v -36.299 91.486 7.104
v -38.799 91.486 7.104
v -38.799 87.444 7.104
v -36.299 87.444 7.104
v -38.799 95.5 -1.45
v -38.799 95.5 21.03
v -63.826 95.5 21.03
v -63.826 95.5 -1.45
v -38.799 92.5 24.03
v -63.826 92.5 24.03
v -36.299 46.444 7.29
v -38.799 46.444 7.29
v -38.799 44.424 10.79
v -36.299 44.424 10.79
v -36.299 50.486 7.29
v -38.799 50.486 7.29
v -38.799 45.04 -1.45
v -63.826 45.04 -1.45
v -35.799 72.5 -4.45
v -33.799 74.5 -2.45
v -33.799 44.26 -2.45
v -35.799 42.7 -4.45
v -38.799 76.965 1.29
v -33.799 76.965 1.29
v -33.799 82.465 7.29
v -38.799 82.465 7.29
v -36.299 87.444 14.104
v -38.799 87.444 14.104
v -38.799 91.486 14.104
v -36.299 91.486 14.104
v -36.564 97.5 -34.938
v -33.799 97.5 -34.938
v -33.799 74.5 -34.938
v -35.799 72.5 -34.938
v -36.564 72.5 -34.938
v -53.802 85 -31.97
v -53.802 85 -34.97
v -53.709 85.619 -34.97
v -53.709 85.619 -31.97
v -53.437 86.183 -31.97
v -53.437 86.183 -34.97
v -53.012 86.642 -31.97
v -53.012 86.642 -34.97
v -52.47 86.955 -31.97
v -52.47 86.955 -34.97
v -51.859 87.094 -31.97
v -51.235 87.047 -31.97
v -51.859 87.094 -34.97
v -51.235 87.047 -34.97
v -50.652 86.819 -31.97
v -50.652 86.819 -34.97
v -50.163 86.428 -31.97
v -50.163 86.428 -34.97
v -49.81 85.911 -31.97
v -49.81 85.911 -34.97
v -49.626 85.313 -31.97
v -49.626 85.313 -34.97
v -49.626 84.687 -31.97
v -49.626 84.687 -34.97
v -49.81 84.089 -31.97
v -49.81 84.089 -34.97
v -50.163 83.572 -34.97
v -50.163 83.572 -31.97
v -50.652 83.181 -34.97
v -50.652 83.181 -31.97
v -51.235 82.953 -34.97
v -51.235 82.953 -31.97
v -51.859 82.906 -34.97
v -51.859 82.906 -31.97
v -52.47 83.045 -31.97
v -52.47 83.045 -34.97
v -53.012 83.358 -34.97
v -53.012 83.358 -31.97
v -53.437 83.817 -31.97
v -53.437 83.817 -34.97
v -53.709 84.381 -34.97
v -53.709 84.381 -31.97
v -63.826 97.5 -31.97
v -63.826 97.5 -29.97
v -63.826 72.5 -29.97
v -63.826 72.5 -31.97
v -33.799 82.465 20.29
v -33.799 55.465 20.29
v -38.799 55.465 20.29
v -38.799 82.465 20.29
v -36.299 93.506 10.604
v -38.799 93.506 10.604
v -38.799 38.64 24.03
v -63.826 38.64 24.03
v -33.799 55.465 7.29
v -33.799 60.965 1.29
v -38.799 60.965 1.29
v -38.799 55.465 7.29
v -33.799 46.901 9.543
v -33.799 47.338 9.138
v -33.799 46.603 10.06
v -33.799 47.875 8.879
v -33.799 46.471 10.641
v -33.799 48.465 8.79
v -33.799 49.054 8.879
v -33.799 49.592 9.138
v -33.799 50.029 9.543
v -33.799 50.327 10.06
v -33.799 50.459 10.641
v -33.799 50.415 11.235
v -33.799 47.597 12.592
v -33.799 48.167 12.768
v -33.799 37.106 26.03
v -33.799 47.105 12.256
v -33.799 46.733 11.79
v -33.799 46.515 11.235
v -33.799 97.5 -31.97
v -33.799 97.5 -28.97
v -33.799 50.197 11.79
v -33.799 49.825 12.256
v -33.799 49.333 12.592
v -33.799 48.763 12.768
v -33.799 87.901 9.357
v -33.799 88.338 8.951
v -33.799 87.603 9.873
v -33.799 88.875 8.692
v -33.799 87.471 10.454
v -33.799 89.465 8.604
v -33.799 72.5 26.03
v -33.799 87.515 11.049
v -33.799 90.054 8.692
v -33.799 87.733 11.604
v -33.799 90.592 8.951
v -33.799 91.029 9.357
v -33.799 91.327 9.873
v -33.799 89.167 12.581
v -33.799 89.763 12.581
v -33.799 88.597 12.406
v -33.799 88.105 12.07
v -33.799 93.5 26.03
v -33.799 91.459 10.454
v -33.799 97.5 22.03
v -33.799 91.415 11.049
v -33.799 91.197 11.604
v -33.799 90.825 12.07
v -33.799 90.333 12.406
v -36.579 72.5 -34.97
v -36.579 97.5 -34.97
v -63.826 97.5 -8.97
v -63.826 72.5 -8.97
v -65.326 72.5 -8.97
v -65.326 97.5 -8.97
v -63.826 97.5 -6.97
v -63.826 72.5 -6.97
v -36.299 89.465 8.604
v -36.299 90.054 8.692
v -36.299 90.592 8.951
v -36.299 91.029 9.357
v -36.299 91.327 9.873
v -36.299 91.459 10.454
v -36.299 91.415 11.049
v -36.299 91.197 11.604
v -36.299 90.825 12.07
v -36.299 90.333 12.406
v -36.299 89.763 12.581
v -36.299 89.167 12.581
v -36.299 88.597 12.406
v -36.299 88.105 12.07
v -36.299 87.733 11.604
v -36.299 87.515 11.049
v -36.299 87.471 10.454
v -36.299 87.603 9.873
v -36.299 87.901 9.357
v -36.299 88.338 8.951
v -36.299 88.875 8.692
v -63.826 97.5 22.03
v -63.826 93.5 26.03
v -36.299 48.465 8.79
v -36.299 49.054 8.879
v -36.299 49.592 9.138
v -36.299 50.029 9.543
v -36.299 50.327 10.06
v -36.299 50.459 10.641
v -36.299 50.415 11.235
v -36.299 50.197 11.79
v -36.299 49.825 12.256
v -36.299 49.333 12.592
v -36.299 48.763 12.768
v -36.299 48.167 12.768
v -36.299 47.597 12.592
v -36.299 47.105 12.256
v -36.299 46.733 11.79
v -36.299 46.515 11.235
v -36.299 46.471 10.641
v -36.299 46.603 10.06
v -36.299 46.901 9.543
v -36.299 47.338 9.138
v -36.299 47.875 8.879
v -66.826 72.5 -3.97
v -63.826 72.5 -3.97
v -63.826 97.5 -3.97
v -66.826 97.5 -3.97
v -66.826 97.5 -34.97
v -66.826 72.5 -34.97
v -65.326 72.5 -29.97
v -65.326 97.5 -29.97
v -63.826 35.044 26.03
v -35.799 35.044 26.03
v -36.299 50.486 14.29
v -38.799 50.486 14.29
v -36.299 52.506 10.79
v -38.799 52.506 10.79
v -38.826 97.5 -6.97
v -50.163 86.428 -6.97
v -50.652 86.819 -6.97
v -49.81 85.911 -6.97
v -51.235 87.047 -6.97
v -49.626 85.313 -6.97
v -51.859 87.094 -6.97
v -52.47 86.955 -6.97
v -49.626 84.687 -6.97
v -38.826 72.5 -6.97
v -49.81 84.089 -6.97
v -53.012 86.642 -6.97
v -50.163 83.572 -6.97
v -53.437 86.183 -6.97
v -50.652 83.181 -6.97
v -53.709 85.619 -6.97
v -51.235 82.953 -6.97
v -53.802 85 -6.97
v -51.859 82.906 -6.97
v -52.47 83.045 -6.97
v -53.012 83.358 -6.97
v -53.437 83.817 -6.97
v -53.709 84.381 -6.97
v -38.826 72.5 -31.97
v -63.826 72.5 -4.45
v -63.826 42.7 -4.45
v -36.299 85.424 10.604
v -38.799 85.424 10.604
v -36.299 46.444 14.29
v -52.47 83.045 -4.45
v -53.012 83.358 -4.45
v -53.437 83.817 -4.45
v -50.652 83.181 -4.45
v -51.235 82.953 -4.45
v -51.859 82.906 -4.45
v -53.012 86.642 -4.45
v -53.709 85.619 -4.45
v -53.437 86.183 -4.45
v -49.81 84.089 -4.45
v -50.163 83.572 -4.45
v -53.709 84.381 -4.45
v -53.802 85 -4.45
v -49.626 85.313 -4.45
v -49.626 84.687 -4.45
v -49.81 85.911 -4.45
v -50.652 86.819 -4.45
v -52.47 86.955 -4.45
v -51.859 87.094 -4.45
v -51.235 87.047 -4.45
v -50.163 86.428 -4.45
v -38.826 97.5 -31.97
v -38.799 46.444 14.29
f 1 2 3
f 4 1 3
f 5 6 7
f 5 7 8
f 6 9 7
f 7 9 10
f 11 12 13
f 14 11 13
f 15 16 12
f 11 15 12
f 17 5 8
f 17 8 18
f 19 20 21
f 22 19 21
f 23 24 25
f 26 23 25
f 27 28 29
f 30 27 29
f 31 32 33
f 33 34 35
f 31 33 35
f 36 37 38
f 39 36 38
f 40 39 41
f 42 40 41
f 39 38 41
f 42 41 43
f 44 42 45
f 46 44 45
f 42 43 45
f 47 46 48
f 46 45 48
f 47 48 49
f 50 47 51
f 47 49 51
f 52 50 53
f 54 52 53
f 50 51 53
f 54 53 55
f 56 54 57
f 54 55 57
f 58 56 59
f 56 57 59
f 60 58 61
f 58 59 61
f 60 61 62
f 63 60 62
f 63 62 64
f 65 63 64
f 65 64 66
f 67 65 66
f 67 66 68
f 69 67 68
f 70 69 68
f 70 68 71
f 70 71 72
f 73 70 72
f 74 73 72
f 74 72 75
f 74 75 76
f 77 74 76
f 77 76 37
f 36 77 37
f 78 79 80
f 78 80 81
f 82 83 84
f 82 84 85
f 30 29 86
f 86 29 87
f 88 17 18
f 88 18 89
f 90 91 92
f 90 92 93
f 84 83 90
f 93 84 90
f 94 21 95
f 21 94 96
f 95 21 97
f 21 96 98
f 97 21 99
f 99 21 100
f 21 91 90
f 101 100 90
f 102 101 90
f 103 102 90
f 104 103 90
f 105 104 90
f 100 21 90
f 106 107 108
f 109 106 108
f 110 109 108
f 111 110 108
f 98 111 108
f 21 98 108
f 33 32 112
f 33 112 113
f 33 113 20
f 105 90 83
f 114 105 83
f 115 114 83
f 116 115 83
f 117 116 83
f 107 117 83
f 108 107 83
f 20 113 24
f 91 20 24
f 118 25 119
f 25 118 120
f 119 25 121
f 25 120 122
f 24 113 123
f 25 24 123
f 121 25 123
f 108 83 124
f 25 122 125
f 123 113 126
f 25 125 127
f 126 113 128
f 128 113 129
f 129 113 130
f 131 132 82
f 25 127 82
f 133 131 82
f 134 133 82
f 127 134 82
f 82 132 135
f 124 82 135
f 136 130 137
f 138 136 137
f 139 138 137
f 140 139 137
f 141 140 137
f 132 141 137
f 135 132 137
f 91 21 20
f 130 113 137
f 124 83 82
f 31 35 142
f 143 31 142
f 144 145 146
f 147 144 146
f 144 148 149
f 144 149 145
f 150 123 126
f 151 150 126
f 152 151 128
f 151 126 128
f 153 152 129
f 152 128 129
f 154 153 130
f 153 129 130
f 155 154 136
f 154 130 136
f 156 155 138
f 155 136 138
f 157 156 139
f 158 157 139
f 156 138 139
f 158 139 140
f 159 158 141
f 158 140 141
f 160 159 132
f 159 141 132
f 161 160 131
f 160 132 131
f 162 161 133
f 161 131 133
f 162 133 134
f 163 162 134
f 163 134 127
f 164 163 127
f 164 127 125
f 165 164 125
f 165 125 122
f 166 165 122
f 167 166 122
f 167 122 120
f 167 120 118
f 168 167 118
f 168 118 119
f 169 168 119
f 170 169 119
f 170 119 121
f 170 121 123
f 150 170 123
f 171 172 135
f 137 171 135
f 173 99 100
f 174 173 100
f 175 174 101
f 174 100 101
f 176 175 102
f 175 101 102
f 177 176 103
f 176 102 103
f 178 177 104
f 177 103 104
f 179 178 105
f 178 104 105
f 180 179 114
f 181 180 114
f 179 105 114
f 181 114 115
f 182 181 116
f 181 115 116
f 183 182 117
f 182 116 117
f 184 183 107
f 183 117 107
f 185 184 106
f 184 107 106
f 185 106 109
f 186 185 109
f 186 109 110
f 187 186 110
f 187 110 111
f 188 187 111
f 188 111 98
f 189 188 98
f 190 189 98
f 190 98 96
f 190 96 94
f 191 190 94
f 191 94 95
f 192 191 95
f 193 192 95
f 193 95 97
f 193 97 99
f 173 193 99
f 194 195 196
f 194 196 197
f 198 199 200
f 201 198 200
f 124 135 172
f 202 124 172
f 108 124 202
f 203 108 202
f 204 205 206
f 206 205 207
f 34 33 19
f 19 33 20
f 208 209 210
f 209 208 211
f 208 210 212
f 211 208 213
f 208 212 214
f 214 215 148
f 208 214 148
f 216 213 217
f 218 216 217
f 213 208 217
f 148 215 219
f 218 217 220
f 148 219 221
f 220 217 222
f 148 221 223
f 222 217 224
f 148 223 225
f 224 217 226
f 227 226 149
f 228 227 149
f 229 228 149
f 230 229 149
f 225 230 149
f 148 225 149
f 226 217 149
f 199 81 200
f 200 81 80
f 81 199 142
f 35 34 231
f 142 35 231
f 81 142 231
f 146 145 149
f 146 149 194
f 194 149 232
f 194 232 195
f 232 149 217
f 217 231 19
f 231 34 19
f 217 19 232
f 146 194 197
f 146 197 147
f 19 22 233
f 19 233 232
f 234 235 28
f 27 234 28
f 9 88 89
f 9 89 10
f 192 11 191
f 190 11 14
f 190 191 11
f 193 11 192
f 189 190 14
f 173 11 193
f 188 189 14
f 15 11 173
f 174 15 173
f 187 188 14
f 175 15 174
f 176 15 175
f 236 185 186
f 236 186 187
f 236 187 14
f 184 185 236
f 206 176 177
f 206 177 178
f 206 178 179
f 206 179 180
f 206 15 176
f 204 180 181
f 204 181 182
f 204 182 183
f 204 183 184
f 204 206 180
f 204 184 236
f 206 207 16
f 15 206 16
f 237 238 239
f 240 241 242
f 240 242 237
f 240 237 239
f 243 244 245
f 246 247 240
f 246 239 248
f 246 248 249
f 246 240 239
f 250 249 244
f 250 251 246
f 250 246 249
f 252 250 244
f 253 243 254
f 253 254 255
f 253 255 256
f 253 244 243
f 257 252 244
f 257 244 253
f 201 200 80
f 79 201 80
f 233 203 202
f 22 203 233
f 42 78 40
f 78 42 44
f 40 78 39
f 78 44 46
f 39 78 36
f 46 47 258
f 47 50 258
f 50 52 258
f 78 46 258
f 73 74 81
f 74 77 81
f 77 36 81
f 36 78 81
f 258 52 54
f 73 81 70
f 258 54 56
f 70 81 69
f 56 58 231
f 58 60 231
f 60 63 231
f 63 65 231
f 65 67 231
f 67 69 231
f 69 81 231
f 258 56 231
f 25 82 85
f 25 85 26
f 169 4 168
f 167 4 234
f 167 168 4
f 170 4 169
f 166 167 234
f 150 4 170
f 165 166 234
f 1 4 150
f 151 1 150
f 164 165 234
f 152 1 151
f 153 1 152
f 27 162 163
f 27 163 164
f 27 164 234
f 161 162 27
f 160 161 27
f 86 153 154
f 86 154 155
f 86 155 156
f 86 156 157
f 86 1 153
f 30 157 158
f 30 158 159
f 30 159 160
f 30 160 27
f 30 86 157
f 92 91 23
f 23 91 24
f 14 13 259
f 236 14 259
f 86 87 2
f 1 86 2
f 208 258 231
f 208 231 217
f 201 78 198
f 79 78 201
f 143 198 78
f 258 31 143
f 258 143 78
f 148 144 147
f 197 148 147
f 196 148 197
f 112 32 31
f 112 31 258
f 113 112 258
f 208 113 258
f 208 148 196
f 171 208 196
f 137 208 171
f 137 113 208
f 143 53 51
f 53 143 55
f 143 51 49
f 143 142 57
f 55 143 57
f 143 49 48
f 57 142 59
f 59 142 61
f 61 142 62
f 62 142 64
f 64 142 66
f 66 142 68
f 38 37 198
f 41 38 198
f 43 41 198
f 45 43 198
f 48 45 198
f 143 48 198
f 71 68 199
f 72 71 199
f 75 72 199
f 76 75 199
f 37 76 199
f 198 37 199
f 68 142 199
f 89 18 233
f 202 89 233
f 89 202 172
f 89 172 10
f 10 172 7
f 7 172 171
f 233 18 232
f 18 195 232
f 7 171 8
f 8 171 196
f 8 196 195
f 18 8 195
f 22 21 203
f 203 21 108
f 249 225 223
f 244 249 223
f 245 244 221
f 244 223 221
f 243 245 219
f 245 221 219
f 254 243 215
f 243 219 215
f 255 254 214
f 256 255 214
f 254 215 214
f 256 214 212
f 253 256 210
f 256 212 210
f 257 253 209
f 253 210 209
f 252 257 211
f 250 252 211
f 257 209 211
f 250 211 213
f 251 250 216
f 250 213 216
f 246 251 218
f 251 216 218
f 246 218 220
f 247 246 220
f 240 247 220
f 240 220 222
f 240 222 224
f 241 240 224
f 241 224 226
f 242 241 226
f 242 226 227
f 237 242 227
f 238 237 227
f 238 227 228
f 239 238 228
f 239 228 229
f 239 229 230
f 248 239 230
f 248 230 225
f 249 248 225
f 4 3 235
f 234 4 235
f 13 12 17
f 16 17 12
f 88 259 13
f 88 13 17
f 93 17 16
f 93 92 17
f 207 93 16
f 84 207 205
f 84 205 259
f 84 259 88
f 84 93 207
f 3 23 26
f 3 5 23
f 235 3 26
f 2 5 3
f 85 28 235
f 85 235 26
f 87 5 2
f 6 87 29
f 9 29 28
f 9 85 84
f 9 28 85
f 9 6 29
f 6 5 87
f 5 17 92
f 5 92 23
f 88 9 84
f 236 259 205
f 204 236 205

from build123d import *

# Parameters (mm, degrees)
EXTRUDE_1_DEPTH           = 110
CUT_EXTRUDE_4_DEPTH       = 134.373777696
SKETCH_7_W                = 16.60831278
SKETCH_7_H                = 38.473598513
CUT_EXTRUDE_14_DEPTH      = 134.373777696
SKETCH_8_W                = 5
SKETCH_8_H                = 30.968526609
EXTRUDE_2_DEPTH           = 110
SKETCH_10_W               = 5
SKETCH_10_H               = 26
EXTRUDE_4_DEPTH           = 110
SKETCH_16_W               = 45
SKETCH_16_H               = 4
EXTRUDE_7_DEPTH           = 110
SKETCH_18_W               = 113.67218818
SKETCH_18_H               = 61.649849458
CUT_EXTRUDE_18_DEPTH      = 137.586229955
SKETCH_19_R               = 2.1
SKETCH_19_R_2             = 2
CUT_EXTRUDE_19_DEPTH      = 143.431323365
SKETCH_22_W               = 25
SKETCH_22_H               = 3
EXTRUDE_10_DEPTH          = 50
SKETCH_23_R               = 2
CUT_EXTRUDE_24_DEPTH      = 10
CUT_EXTRUDE_25_DEPTH      = 138.145152867
CUT_EXTRUDE_25_DEPTH_BACK = 138.145152867
SKETCH_24_W               = 94.85705968
SKETCH_24_H               = 31.336652995
SKETCH_24_W_2             = 96.91469655
SKETCH_24_H_2             = 33.70168341
SKETCH_26_W               = 42.056158723
SKETCH_26_H               = 66.577758737
CUT_EXTRUDE_26_DEPTH      = 85.230722286
EXTRUDE_11_DEPTH          = 5
SKETCH_28_R               = 2
SKETCH_28_W               = 19
SKETCH_28_H               = 27
CUT_EXTRUDE_27_DEPTH      = 109.719377855
EXTRUDE_13_DEPTH          = 5
EXTRUDE_14_DEPTH          = 25.02681365
EXTRUDE_15_DEPTH          = 25.02681365
CHAMFER_1_SIZE            = 4
CHAMFER_2_SIZE            = 3
CUT_EXTRUDE_28_DEPTH      = 2.5
CHAMFER_3_SIZE            = 2
CHAMFER_4_SIZE            = 2


with BuildPart() as part:
    # Эскиз1 → Бобышка-Вытянуть1 (new body)
    with BuildSketch(Plane(origin=(0, 0, 0), x_dir=(1, 0, 0), z_dir=(0, 1, 0))):
        Polygon((-66.825757576, 34.969739794), (-66.825757576, 29.969739794), (-63.825757576, 29.969739794), (-63.825757576, 31.969739794), (-38.825757576, 31.969739794), (-38.825757576, 6.969739794), (-63.825757576, 6.969739794), (-63.825757576, 8.969739794), (-66.825757576, 8.969739794), (-66.825757576, 3.969739794), (-22.123470102, 3.969739794), (-36.579007505, 34.969739794), align=None)
    extrude(amount=EXTRUDE_1_DEPTH)

    # Эскиз3 → Вырез-Вытянуть4 (cut, through all)
    with BuildSketch(Plane.XZ):
        Polygon((-66.825757576, -3.969739794), (-65.325757576, -8.969739794), (-66.825757576, -8.969739794), align=None)
        Polygon((-66.825757576, -29.969739794), (-66.825757576, -34.969739794), (-65.325757576, -29.969739794), align=None)
    extrude(amount=-CUT_EXTRUDE_4_DEPTH, mode=Mode.SUBTRACT)

    # Эскиз7 → Вырез-Вытянуть14 (cut, through all)
    with BuildSketch(Plane(origin=(0, 0, 0), x_dir=(-1, 0, 0), z_dir=(0, -1, 0))):
        with Locations((27.703474463, 20.539743139)):
            Rectangle(SKETCH_7_W, SKETCH_7_H)
    extrude(amount=-CUT_EXTRUDE_14_DEPTH, mode=Mode.SUBTRACT)

    # Эскиз8 → Бобышка-Вытянуть2 (add)
    with BuildSketch(Plane(origin=(0, 0, 0), x_dir=(-1, 0, 0), z_dir=(0, -1, 0))):
        with Locations((36.298943925, 19.454003098)):
            Rectangle(SKETCH_8_W, SKETCH_8_H)
    extrude(amount=-EXTRUDE_2_DEPTH)

    # Эскиз10 → Бобышка-Вытянуть4 (add)
    with BuildSketch(Plane.XZ):
        with Locations((-36.298943925, 9.030260206)):
            Rectangle(SKETCH_10_W, SKETCH_10_H)
    extrude(amount=-EXTRUDE_4_DEPTH)

    # Эскиз16 → Бобышка-Вытянуть7 (add, through all)
    with BuildSketch(Plane(origin=(0, 110, 0), x_dir=(1, 0, 0), z_dir=(0, 1, 0))):
        with Locations((-16.298943925, -24.030260206)):
            Rectangle(SKETCH_16_W, SKETCH_16_H)
    extrude(amount=-EXTRUDE_7_DEPTH)

    # Эскиз18 → Вырез-Вытянуть18 (cut, through all)
    with BuildSketch(Plane(origin=(6.201056075, 0, 0), x_dir=(0, 0, -1), z_dir=(1, 0, 0))):
        with Locations((3.709673157, 29.175075271)):
            Rectangle(SKETCH_18_W, SKETCH_18_H)
    extrude(amount=-CUT_EXTRUDE_18_DEPTH, mode=Mode.SUBTRACT)

    # Эскиз19 → Вырез-Вытянуть19 (cut, through all)
    with BuildSketch(Plane(origin=(0, 0, -34.969739794), x_dir=(-1, 0, 0), z_dir=(0, 0, -1))):
        with Locations((51.70238254, 85)):
            Circle(SKETCH_19_R)
        with Locations((3.798943925, 85)):
            Circle(SKETCH_19_R_2)
    extrude(amount=-CUT_EXTRUDE_19_DEPTH, mode=Mode.SUBTRACT)

    # Эскиз22 → Бобышка-Вытянуть10 (add)
    with BuildSketch(Plane.XZ.offset(-60)):
        with Locations((-21.298943925, -30.469739794)):
            Rectangle(SKETCH_22_W, SKETCH_22_H)
    extrude(amount=-EXTRUDE_10_DEPTH)

    # Эскиз23 → Вырез-Вытянуть24 (cut)
    with BuildSketch(Plane(origin=(0, 0, -31.969739794), x_dir=(-1, 0, 0), z_dir=(0, 0, -1))):
        with Locations((21.298943925, 85)):
            Circle(SKETCH_23_R)
    extrude(amount=-CUT_EXTRUDE_24_DEPTH, mode=Mode.SUBTRACT)

    # Эскиз24 → Вырез-Вытянуть25 (cut, two sides: drawn at the far end of the back side and taken through both)
    with BuildSketch(Plane(origin=(-62.400623407, 0, -18.720187022), x_dir=(-0.2873478855663458, 0, 0.9578262852211513), z_dir=(-0.9578262852211514, 0, -0.2873478855663458)).offset(-CUT_EXTRUDE_25_DEPTH_BACK)):
        with Locations((8.655390038, 113.168326498)):
            Rectangle(SKETCH_24_W, SKETCH_24_H)
        with Locations((7.626571603, 55.649158295)):
            Rectangle(SKETCH_24_W_2, SKETCH_24_H_2)
    extrude(amount=CUT_EXTRUDE_25_DEPTH + CUT_EXTRUDE_25_DEPTH_BACK, mode=Mode.SUBTRACT)

    # Эскиз26 → Вырез-Вытянуть26 (cut, through all)
    with BuildSketch(Plane.XZ.offset(-60)):
        with Locations((-12.770864564, -1.649387034)):
            Rectangle(SKETCH_26_W, SKETCH_26_H)
    extrude(amount=-CUT_EXTRUDE_26_DEPTH, mode=Mode.SUBTRACT)

    # Эскиз27 → Бобышка-Вытянуть11 (add)
    with BuildSketch(Plane(origin=(-33.798943925, 0, 0), x_dir=(0, 0, -1), z_dir=(1, 0, 0))):
        Polygon((-26.030260206, 72.5), (4.449739794, 72.5), (4.449739794, 42.7), (-26.030260206, 35.043953179), align=None)
    extrude(amount=-EXTRUDE_11_DEPTH)

    # Эскиз28 → Вырез-Вытянуть27 (cut, through all)
    with BuildSketch(Plane(origin=(-33.798943925, 0, 0), x_dir=(0, 0, -1), z_dir=(1, 0, 0))):
        with Locations((-10.603567011, 89.464970071)):
            Circle(SKETCH_28_R)
        with Locations((-10.790260206, 48.464970071)):
            Circle(SKETCH_28_R)
        with Locations((-10.790260206, 68.964970071)):
            Rectangle(SKETCH_28_W, SKETCH_28_H)
    extrude(amount=-CUT_EXTRUDE_27_DEPTH, mode=Mode.SUBTRACT)

    # Эскиз29 → Бобышка-Вытянуть13 (add)
    with BuildSketch(Plane(origin=(-33.798943925, 0, 0), x_dir=(0, 0, -1), z_dir=(1, 0, 0))):
        Polygon((-7.290260206, 82.464970071), (-1.290260206, 82.464970071), (-1.290260206, 76.964970071), align=None)
        Polygon((-1.290260206, 60.964970071), (-7.290260206, 55.464970071), (-1.290260206, 55.464970071), align=None)
    extrude(amount=-EXTRUDE_13_DEPTH)

    # Эскиз30 → Бобышка-Вытянуть14 (add)
    with BuildSketch(Plane.ZY.offset(38.798943925)):
        Polygon((-4.449739794, 42.7), (-4.449739794, 97.5), (-1.449739794, 97.5), (-1.449739794, 45.039643715), (26.030260206, 38.137144809), (26.030260206, 35.043953179), align=None)
    extrude(amount=EXTRUDE_14_DEPTH)

    # Эскиз32 → Бобышка-Вытянуть15 (add)
    with BuildSketch(Plane.ZY.offset(38.798943925)):
        Polygon((-1.449739794, 97.5), (26.030260206, 97.5), (26.030260206, 38.137144809), (24.030260206, 38.639510086), (24.030260206, 95.5), (-1.449739794, 95.5), align=None)
    extrude(amount=EXTRUDE_15_DEPTH)

    # Фаска1
    chamfer_1_edges = [part.edges().sort_by_distance(p)[0] for p in [
        (-48.81235075, 97.5, 26.030260206),
    ]]
    chamfer(chamfer_1_edges, length=CHAMFER_1_SIZE - 0.0001)  # a hair under: the kernel refuses the full size

    # Фаска2
    chamfer_2_edges = [part.edges().sort_by_distance(p)[0] for p in [
        (-51.31235075, 95.5, 24.030260206),
    ]]
    chamfer(chamfer_2_edges, length=CHAMFER_2_SIZE)

    # Эскиз33 → Вырез-Вытянуть28 (cut)
    with BuildSketch(Plane.ZY.offset(38.798943925)):
        Polygon((10.603567011, 93.506421955), (7.103567011, 91.485696013), (7.103567011, 87.444244129), (10.603567011, 85.423518186), (14.103567011, 87.444244129), (14.103567011, 91.485696013), align=None)
        Polygon((10.790260206, 52.506421955), (7.290260206, 50.485696013), (7.290260206, 46.444244129), (10.790260206, 44.423518186), (14.290260206, 46.444244129), (14.290260206, 50.485696013), align=None)
    extrude(amount=-CUT_EXTRUDE_28_DEPTH, mode=Mode.SUBTRACT)

    # Фаска3
    chamfer_3_edges = [part.edges().sort_by_distance(p)[0] for p in [
        (-33.798943925, 72.5, -19.694003099),
        (-33.798943925, 57.6, -4.449739794),
    ]]
    chamfer(chamfer_3_edges, length=CHAMFER_3_SIZE)

    # Фаска4
    chamfer_4_edges = [part.edges().sort_by_distance(p)[0] for p in [
        (-33.798943925, 38.620793951, 11.790260206),
    ]]
    chamfer(chamfer_4_edges, length=CHAMFER_4_SIZE)


solid = part.part
